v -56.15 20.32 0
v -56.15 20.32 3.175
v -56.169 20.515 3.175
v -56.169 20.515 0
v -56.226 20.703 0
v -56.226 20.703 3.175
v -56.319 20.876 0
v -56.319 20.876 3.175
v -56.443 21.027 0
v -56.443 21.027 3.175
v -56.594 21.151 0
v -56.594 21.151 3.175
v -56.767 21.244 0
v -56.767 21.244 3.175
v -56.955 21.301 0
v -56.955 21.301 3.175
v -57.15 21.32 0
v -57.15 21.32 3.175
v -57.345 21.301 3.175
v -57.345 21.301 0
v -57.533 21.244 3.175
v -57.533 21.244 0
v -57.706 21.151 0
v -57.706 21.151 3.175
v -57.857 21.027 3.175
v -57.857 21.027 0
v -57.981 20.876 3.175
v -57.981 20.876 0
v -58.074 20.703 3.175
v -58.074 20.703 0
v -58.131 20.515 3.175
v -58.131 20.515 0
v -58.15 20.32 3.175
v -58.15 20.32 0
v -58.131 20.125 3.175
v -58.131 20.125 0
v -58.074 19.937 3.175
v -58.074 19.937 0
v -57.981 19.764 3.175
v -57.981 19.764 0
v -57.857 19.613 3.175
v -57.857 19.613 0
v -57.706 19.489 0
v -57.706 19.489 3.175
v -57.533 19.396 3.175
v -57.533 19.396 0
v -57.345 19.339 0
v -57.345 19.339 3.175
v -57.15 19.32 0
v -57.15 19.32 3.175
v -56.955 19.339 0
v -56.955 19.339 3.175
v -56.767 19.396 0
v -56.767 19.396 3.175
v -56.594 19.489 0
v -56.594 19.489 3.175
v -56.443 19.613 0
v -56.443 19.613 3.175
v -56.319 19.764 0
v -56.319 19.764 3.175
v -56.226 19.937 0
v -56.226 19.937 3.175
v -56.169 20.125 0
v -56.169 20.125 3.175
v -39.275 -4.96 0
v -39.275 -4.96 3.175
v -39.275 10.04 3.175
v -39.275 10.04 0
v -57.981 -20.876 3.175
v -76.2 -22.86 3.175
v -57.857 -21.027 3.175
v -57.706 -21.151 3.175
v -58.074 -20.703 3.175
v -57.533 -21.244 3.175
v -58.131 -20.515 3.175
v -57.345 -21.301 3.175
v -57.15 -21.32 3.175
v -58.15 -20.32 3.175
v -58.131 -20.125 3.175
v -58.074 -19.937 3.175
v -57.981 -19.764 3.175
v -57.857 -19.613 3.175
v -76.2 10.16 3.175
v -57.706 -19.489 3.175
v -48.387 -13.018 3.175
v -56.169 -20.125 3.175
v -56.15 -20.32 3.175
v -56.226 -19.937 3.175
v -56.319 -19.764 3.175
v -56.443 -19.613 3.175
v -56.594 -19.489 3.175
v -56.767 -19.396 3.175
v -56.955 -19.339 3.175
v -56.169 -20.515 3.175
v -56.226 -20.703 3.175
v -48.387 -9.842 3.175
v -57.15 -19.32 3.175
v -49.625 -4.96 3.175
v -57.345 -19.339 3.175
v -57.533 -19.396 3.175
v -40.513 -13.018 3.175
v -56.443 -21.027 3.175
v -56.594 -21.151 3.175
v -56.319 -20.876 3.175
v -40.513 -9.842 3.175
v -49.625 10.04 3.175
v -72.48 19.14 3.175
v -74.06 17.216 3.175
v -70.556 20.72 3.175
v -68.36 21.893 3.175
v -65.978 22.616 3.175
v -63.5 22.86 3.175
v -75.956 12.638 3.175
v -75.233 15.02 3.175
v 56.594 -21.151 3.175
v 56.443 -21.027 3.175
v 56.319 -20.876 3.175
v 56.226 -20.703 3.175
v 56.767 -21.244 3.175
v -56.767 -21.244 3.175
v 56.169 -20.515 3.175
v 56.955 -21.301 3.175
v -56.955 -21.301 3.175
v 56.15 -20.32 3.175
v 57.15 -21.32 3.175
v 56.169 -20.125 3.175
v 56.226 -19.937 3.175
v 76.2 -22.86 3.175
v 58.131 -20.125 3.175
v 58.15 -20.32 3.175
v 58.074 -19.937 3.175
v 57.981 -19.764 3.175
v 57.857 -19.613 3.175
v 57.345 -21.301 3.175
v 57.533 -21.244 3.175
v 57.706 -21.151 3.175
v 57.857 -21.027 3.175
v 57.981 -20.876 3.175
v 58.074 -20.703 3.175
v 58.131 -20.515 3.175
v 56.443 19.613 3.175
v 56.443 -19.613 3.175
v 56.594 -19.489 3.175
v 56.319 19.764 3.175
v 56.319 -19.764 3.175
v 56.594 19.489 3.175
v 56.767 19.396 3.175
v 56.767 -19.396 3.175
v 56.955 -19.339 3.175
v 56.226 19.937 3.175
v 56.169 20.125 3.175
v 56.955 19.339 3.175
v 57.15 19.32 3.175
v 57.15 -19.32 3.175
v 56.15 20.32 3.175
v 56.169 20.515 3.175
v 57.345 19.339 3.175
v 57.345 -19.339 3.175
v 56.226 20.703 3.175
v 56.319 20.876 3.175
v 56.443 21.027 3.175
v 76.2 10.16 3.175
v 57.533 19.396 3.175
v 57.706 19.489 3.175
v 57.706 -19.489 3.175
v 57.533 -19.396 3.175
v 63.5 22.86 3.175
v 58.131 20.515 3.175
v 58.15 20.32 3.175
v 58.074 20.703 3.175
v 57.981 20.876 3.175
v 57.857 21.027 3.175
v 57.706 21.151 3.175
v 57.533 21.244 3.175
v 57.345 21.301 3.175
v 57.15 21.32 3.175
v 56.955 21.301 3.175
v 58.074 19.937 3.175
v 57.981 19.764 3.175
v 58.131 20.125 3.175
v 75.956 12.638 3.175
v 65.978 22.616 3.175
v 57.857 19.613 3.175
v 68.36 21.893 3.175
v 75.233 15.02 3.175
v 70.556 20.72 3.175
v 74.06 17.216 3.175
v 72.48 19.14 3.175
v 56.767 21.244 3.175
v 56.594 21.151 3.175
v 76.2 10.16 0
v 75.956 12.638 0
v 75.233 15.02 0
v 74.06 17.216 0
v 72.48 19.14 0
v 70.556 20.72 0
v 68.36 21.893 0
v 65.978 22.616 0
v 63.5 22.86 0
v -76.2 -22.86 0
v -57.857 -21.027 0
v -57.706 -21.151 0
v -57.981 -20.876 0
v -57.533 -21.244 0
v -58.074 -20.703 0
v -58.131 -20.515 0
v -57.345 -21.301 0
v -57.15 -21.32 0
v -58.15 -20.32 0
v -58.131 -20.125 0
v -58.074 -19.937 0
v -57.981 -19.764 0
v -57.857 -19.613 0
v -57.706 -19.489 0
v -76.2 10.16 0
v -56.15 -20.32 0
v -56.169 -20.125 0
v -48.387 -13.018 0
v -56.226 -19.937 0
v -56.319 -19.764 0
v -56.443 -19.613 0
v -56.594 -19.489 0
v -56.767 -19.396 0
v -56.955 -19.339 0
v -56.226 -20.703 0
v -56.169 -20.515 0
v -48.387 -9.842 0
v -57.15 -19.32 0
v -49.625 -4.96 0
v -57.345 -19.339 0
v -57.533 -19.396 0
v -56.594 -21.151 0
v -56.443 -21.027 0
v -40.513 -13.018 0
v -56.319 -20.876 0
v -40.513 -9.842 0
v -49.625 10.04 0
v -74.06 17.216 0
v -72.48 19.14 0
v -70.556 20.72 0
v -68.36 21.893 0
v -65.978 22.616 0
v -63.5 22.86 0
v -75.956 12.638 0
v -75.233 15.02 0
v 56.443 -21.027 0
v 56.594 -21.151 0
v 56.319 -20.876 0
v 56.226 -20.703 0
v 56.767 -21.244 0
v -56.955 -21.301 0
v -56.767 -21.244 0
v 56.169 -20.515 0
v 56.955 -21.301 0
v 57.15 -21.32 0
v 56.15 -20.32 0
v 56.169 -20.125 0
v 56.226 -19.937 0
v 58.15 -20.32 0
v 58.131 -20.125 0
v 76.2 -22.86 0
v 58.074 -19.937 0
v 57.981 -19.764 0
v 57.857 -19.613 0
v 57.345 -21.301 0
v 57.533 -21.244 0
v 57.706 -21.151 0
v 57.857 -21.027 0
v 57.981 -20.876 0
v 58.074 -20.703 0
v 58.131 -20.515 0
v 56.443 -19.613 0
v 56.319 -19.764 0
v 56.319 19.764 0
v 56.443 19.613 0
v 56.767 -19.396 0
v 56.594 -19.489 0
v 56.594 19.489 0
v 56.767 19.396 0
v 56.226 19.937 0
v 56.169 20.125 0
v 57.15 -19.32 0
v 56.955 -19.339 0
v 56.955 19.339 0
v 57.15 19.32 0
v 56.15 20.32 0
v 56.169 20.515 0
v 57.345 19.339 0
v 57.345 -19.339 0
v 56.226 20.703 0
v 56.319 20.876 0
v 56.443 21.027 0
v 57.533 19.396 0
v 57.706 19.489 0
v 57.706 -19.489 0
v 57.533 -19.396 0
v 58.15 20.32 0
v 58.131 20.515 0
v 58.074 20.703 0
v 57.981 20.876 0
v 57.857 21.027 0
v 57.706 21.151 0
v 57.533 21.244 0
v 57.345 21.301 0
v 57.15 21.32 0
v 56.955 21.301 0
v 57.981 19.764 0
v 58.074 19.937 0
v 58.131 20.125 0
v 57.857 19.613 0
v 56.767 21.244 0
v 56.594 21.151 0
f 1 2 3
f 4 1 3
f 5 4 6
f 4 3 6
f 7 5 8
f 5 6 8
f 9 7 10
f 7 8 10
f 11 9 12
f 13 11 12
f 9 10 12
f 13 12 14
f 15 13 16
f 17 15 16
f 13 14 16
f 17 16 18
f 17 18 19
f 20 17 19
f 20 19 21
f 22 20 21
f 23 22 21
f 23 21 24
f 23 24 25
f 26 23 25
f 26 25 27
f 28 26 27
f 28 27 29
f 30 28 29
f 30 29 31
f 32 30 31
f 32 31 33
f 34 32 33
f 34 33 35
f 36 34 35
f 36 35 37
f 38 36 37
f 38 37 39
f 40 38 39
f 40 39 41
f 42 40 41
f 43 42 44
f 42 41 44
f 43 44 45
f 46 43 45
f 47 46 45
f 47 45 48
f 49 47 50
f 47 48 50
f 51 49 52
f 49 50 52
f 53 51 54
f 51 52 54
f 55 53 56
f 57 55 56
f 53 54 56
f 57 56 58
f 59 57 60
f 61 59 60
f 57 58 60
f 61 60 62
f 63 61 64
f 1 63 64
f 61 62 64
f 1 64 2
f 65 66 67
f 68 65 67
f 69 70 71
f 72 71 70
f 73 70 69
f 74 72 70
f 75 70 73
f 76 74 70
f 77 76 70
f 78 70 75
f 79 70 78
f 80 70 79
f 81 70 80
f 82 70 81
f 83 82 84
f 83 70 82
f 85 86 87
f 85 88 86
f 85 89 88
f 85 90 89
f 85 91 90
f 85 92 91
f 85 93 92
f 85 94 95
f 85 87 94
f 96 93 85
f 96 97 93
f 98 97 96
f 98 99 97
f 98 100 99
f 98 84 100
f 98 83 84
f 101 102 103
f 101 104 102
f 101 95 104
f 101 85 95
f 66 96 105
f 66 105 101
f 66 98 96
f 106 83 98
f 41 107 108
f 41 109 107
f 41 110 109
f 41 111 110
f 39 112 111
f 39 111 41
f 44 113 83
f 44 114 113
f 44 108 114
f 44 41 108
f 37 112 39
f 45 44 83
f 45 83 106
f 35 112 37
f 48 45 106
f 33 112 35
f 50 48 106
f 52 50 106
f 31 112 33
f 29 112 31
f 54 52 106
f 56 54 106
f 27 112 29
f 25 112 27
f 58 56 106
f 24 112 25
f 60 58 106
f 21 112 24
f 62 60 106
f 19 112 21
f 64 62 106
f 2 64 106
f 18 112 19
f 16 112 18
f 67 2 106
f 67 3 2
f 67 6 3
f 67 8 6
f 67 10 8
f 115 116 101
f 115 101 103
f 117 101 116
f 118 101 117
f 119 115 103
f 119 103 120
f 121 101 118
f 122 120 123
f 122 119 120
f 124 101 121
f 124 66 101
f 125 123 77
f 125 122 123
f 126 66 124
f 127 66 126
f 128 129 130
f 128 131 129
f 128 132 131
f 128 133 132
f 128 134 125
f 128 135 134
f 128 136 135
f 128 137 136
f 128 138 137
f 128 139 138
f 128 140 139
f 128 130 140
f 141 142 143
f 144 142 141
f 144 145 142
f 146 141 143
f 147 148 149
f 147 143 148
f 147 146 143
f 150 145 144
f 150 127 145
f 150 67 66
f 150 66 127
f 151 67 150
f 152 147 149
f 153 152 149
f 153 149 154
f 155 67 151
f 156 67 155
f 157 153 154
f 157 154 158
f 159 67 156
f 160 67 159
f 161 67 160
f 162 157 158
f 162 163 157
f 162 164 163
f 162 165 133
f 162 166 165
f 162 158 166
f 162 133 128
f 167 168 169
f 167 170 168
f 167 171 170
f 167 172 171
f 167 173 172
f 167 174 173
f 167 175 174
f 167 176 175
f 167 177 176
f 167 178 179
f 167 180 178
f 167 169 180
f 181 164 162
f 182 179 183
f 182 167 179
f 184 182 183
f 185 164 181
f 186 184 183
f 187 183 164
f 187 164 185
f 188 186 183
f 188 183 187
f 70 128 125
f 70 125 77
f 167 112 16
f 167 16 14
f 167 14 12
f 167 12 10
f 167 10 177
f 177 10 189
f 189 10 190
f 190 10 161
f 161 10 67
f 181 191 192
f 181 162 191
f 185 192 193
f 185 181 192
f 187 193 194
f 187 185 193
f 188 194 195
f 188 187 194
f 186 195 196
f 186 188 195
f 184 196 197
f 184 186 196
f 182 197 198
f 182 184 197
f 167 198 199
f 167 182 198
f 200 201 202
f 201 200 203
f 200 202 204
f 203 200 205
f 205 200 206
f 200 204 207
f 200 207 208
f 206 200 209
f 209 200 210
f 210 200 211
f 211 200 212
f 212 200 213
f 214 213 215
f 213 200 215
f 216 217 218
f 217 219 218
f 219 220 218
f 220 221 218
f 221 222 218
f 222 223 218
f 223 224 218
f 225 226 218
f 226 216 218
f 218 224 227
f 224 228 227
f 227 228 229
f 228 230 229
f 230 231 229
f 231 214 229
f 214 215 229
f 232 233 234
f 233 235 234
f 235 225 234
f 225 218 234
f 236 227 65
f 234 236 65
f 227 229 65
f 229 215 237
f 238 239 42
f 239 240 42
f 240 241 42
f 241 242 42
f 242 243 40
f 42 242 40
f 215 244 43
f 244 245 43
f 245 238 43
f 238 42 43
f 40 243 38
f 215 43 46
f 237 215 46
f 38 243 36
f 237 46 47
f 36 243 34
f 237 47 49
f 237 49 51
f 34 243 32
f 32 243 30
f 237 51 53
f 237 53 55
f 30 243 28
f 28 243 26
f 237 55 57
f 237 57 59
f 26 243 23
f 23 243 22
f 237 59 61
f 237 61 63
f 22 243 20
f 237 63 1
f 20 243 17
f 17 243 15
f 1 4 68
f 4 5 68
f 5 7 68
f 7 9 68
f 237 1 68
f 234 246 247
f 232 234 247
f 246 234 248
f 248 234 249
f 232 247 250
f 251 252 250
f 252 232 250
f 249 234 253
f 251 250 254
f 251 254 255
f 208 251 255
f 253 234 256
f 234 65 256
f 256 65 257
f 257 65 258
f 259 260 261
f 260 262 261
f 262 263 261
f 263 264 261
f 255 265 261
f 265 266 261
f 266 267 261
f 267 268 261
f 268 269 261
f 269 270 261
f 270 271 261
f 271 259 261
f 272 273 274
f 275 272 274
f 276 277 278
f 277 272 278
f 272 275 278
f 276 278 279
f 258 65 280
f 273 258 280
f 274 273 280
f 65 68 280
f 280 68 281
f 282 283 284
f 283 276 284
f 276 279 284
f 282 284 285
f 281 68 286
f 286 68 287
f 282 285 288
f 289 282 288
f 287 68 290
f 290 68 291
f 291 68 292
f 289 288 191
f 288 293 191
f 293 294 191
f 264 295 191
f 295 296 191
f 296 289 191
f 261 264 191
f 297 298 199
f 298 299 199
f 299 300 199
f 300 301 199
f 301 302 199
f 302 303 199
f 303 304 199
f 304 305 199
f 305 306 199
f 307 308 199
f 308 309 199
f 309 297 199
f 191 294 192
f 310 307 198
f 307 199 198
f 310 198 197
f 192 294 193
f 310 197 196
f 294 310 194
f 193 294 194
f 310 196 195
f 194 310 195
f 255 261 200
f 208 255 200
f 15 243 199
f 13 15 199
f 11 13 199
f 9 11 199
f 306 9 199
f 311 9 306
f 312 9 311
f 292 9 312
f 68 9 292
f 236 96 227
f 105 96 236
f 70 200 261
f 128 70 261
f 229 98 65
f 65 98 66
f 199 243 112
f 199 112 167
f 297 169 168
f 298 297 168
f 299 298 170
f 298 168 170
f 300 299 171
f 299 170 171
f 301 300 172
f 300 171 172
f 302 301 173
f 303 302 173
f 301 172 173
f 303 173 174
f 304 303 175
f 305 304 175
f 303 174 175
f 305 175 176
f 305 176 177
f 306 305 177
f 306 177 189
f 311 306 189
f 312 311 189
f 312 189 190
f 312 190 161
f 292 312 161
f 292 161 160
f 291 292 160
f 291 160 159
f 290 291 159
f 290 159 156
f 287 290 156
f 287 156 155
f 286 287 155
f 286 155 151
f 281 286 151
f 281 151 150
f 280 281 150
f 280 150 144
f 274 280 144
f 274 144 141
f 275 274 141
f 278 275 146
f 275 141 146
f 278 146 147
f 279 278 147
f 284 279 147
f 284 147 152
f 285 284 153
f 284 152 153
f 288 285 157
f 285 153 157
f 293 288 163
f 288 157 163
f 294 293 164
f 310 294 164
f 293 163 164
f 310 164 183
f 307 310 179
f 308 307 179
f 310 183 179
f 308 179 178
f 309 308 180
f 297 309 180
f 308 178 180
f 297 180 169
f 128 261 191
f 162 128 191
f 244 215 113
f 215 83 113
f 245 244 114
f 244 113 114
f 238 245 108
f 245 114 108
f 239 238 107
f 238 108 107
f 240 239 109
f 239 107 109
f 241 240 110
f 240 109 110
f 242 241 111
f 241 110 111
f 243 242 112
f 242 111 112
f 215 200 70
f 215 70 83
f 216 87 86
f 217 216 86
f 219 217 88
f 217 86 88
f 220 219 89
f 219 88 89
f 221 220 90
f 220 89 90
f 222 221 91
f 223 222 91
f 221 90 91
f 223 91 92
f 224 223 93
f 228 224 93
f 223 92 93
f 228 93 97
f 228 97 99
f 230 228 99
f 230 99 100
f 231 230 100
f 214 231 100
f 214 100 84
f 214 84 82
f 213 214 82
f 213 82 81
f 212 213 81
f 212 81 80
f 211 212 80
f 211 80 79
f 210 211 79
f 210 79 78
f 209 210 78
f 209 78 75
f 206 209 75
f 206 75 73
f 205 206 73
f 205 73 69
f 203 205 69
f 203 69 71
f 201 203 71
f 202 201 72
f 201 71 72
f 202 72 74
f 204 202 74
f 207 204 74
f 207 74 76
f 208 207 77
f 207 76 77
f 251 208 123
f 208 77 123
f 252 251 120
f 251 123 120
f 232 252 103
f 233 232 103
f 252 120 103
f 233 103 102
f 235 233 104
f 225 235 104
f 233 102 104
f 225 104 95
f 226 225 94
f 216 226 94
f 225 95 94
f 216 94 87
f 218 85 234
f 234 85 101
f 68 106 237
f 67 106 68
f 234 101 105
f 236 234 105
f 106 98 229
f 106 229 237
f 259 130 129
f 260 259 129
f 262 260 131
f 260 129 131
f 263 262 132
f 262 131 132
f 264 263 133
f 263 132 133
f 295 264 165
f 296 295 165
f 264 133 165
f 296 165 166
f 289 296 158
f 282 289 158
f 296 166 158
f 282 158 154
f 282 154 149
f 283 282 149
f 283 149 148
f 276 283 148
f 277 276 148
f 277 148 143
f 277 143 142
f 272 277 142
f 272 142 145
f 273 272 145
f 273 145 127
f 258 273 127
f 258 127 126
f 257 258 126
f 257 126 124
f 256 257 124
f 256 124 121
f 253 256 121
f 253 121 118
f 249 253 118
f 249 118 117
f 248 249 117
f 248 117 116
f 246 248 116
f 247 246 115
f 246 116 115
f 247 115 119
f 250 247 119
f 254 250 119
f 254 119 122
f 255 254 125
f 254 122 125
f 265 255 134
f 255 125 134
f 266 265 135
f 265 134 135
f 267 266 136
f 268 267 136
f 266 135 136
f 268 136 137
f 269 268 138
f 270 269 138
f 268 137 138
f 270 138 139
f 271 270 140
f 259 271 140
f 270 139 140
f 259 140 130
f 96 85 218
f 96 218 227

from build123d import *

# Parameters (mm, degrees)
SKETCH1_W           = 152.4
SKETCH1_H           = 45.72
BOSS_EXTRUDE1_DEPTH = 3.175
FILLET1_R           = 12.7
SKETCH2_R           = 0.999998
CUT_EXTRUDE1_DEPTH  = 4.175
SKETCH3_W           = 7.874
SKETCH3_H           = 3.175
CUT_EXTRUDE2_DEPTH  = 4.175
SKETCH4_W           = 10.35
SKETCH4_H           = 15
CUT_EXTRUDE3_DEPTH  = 4.175


with BuildPart() as part:
    # Sketch1 → Boss-Extrude1 (new body)
    with BuildSketch(Plane.XY):
        Rectangle(SKETCH1_W, SKETCH1_H)
    extrude(amount=BOSS_EXTRUDE1_DEPTH)

    # Fillet1
    fillet1_edges = [part.edges().sort_by_distance(p)[0] for p in [
        (-76.2, 22.86, 1.5875),
        (76.2, 22.86, 1.5875),
    ]]
    fillet(fillet1_edges, radius=FILLET1_R)

    # Sketch2 → Cut-Extrude1 (cut, through all)
    with BuildSketch(Plane.XY.offset(3.175)):
        with Locations((-57.15, -20.32)):
            Circle(SKETCH2_R)
        with Locations((-57.15, 20.32)):
            Circle(SKETCH2_R)
        with Locations((57.15, -20.32)):
            Circle(SKETCH2_R)
        with Locations((57.15, 20.32)):
            Circle(SKETCH2_R)
    extrude(amount=-CUT_EXTRUDE1_DEPTH, mode=Mode.SUBTRACT)

    # Sketch3 → Cut-Extrude2 (cut, through all)
    with BuildSketch(Plane.XY.offset(3.175)):
        with Locations((-44.45, -11.43)):
            Rectangle(SKETCH3_W, SKETCH3_H)
    extrude(amount=-CUT_EXTRUDE2_DEPTH, mode=Mode.SUBTRACT)

    # Sketch4 → Cut-Extrude3 (cut, through all)
    with BuildSketch(Plane.XY.offset(3.175)):
        with Locations((-44.45, 2.54)):
            Rectangle(SKETCH4_W, SKETCH4_H)
    extrude(amount=-CUT_EXTRUDE3_DEPTH, mode=Mode.SUBTRACT)


solid = part.part
